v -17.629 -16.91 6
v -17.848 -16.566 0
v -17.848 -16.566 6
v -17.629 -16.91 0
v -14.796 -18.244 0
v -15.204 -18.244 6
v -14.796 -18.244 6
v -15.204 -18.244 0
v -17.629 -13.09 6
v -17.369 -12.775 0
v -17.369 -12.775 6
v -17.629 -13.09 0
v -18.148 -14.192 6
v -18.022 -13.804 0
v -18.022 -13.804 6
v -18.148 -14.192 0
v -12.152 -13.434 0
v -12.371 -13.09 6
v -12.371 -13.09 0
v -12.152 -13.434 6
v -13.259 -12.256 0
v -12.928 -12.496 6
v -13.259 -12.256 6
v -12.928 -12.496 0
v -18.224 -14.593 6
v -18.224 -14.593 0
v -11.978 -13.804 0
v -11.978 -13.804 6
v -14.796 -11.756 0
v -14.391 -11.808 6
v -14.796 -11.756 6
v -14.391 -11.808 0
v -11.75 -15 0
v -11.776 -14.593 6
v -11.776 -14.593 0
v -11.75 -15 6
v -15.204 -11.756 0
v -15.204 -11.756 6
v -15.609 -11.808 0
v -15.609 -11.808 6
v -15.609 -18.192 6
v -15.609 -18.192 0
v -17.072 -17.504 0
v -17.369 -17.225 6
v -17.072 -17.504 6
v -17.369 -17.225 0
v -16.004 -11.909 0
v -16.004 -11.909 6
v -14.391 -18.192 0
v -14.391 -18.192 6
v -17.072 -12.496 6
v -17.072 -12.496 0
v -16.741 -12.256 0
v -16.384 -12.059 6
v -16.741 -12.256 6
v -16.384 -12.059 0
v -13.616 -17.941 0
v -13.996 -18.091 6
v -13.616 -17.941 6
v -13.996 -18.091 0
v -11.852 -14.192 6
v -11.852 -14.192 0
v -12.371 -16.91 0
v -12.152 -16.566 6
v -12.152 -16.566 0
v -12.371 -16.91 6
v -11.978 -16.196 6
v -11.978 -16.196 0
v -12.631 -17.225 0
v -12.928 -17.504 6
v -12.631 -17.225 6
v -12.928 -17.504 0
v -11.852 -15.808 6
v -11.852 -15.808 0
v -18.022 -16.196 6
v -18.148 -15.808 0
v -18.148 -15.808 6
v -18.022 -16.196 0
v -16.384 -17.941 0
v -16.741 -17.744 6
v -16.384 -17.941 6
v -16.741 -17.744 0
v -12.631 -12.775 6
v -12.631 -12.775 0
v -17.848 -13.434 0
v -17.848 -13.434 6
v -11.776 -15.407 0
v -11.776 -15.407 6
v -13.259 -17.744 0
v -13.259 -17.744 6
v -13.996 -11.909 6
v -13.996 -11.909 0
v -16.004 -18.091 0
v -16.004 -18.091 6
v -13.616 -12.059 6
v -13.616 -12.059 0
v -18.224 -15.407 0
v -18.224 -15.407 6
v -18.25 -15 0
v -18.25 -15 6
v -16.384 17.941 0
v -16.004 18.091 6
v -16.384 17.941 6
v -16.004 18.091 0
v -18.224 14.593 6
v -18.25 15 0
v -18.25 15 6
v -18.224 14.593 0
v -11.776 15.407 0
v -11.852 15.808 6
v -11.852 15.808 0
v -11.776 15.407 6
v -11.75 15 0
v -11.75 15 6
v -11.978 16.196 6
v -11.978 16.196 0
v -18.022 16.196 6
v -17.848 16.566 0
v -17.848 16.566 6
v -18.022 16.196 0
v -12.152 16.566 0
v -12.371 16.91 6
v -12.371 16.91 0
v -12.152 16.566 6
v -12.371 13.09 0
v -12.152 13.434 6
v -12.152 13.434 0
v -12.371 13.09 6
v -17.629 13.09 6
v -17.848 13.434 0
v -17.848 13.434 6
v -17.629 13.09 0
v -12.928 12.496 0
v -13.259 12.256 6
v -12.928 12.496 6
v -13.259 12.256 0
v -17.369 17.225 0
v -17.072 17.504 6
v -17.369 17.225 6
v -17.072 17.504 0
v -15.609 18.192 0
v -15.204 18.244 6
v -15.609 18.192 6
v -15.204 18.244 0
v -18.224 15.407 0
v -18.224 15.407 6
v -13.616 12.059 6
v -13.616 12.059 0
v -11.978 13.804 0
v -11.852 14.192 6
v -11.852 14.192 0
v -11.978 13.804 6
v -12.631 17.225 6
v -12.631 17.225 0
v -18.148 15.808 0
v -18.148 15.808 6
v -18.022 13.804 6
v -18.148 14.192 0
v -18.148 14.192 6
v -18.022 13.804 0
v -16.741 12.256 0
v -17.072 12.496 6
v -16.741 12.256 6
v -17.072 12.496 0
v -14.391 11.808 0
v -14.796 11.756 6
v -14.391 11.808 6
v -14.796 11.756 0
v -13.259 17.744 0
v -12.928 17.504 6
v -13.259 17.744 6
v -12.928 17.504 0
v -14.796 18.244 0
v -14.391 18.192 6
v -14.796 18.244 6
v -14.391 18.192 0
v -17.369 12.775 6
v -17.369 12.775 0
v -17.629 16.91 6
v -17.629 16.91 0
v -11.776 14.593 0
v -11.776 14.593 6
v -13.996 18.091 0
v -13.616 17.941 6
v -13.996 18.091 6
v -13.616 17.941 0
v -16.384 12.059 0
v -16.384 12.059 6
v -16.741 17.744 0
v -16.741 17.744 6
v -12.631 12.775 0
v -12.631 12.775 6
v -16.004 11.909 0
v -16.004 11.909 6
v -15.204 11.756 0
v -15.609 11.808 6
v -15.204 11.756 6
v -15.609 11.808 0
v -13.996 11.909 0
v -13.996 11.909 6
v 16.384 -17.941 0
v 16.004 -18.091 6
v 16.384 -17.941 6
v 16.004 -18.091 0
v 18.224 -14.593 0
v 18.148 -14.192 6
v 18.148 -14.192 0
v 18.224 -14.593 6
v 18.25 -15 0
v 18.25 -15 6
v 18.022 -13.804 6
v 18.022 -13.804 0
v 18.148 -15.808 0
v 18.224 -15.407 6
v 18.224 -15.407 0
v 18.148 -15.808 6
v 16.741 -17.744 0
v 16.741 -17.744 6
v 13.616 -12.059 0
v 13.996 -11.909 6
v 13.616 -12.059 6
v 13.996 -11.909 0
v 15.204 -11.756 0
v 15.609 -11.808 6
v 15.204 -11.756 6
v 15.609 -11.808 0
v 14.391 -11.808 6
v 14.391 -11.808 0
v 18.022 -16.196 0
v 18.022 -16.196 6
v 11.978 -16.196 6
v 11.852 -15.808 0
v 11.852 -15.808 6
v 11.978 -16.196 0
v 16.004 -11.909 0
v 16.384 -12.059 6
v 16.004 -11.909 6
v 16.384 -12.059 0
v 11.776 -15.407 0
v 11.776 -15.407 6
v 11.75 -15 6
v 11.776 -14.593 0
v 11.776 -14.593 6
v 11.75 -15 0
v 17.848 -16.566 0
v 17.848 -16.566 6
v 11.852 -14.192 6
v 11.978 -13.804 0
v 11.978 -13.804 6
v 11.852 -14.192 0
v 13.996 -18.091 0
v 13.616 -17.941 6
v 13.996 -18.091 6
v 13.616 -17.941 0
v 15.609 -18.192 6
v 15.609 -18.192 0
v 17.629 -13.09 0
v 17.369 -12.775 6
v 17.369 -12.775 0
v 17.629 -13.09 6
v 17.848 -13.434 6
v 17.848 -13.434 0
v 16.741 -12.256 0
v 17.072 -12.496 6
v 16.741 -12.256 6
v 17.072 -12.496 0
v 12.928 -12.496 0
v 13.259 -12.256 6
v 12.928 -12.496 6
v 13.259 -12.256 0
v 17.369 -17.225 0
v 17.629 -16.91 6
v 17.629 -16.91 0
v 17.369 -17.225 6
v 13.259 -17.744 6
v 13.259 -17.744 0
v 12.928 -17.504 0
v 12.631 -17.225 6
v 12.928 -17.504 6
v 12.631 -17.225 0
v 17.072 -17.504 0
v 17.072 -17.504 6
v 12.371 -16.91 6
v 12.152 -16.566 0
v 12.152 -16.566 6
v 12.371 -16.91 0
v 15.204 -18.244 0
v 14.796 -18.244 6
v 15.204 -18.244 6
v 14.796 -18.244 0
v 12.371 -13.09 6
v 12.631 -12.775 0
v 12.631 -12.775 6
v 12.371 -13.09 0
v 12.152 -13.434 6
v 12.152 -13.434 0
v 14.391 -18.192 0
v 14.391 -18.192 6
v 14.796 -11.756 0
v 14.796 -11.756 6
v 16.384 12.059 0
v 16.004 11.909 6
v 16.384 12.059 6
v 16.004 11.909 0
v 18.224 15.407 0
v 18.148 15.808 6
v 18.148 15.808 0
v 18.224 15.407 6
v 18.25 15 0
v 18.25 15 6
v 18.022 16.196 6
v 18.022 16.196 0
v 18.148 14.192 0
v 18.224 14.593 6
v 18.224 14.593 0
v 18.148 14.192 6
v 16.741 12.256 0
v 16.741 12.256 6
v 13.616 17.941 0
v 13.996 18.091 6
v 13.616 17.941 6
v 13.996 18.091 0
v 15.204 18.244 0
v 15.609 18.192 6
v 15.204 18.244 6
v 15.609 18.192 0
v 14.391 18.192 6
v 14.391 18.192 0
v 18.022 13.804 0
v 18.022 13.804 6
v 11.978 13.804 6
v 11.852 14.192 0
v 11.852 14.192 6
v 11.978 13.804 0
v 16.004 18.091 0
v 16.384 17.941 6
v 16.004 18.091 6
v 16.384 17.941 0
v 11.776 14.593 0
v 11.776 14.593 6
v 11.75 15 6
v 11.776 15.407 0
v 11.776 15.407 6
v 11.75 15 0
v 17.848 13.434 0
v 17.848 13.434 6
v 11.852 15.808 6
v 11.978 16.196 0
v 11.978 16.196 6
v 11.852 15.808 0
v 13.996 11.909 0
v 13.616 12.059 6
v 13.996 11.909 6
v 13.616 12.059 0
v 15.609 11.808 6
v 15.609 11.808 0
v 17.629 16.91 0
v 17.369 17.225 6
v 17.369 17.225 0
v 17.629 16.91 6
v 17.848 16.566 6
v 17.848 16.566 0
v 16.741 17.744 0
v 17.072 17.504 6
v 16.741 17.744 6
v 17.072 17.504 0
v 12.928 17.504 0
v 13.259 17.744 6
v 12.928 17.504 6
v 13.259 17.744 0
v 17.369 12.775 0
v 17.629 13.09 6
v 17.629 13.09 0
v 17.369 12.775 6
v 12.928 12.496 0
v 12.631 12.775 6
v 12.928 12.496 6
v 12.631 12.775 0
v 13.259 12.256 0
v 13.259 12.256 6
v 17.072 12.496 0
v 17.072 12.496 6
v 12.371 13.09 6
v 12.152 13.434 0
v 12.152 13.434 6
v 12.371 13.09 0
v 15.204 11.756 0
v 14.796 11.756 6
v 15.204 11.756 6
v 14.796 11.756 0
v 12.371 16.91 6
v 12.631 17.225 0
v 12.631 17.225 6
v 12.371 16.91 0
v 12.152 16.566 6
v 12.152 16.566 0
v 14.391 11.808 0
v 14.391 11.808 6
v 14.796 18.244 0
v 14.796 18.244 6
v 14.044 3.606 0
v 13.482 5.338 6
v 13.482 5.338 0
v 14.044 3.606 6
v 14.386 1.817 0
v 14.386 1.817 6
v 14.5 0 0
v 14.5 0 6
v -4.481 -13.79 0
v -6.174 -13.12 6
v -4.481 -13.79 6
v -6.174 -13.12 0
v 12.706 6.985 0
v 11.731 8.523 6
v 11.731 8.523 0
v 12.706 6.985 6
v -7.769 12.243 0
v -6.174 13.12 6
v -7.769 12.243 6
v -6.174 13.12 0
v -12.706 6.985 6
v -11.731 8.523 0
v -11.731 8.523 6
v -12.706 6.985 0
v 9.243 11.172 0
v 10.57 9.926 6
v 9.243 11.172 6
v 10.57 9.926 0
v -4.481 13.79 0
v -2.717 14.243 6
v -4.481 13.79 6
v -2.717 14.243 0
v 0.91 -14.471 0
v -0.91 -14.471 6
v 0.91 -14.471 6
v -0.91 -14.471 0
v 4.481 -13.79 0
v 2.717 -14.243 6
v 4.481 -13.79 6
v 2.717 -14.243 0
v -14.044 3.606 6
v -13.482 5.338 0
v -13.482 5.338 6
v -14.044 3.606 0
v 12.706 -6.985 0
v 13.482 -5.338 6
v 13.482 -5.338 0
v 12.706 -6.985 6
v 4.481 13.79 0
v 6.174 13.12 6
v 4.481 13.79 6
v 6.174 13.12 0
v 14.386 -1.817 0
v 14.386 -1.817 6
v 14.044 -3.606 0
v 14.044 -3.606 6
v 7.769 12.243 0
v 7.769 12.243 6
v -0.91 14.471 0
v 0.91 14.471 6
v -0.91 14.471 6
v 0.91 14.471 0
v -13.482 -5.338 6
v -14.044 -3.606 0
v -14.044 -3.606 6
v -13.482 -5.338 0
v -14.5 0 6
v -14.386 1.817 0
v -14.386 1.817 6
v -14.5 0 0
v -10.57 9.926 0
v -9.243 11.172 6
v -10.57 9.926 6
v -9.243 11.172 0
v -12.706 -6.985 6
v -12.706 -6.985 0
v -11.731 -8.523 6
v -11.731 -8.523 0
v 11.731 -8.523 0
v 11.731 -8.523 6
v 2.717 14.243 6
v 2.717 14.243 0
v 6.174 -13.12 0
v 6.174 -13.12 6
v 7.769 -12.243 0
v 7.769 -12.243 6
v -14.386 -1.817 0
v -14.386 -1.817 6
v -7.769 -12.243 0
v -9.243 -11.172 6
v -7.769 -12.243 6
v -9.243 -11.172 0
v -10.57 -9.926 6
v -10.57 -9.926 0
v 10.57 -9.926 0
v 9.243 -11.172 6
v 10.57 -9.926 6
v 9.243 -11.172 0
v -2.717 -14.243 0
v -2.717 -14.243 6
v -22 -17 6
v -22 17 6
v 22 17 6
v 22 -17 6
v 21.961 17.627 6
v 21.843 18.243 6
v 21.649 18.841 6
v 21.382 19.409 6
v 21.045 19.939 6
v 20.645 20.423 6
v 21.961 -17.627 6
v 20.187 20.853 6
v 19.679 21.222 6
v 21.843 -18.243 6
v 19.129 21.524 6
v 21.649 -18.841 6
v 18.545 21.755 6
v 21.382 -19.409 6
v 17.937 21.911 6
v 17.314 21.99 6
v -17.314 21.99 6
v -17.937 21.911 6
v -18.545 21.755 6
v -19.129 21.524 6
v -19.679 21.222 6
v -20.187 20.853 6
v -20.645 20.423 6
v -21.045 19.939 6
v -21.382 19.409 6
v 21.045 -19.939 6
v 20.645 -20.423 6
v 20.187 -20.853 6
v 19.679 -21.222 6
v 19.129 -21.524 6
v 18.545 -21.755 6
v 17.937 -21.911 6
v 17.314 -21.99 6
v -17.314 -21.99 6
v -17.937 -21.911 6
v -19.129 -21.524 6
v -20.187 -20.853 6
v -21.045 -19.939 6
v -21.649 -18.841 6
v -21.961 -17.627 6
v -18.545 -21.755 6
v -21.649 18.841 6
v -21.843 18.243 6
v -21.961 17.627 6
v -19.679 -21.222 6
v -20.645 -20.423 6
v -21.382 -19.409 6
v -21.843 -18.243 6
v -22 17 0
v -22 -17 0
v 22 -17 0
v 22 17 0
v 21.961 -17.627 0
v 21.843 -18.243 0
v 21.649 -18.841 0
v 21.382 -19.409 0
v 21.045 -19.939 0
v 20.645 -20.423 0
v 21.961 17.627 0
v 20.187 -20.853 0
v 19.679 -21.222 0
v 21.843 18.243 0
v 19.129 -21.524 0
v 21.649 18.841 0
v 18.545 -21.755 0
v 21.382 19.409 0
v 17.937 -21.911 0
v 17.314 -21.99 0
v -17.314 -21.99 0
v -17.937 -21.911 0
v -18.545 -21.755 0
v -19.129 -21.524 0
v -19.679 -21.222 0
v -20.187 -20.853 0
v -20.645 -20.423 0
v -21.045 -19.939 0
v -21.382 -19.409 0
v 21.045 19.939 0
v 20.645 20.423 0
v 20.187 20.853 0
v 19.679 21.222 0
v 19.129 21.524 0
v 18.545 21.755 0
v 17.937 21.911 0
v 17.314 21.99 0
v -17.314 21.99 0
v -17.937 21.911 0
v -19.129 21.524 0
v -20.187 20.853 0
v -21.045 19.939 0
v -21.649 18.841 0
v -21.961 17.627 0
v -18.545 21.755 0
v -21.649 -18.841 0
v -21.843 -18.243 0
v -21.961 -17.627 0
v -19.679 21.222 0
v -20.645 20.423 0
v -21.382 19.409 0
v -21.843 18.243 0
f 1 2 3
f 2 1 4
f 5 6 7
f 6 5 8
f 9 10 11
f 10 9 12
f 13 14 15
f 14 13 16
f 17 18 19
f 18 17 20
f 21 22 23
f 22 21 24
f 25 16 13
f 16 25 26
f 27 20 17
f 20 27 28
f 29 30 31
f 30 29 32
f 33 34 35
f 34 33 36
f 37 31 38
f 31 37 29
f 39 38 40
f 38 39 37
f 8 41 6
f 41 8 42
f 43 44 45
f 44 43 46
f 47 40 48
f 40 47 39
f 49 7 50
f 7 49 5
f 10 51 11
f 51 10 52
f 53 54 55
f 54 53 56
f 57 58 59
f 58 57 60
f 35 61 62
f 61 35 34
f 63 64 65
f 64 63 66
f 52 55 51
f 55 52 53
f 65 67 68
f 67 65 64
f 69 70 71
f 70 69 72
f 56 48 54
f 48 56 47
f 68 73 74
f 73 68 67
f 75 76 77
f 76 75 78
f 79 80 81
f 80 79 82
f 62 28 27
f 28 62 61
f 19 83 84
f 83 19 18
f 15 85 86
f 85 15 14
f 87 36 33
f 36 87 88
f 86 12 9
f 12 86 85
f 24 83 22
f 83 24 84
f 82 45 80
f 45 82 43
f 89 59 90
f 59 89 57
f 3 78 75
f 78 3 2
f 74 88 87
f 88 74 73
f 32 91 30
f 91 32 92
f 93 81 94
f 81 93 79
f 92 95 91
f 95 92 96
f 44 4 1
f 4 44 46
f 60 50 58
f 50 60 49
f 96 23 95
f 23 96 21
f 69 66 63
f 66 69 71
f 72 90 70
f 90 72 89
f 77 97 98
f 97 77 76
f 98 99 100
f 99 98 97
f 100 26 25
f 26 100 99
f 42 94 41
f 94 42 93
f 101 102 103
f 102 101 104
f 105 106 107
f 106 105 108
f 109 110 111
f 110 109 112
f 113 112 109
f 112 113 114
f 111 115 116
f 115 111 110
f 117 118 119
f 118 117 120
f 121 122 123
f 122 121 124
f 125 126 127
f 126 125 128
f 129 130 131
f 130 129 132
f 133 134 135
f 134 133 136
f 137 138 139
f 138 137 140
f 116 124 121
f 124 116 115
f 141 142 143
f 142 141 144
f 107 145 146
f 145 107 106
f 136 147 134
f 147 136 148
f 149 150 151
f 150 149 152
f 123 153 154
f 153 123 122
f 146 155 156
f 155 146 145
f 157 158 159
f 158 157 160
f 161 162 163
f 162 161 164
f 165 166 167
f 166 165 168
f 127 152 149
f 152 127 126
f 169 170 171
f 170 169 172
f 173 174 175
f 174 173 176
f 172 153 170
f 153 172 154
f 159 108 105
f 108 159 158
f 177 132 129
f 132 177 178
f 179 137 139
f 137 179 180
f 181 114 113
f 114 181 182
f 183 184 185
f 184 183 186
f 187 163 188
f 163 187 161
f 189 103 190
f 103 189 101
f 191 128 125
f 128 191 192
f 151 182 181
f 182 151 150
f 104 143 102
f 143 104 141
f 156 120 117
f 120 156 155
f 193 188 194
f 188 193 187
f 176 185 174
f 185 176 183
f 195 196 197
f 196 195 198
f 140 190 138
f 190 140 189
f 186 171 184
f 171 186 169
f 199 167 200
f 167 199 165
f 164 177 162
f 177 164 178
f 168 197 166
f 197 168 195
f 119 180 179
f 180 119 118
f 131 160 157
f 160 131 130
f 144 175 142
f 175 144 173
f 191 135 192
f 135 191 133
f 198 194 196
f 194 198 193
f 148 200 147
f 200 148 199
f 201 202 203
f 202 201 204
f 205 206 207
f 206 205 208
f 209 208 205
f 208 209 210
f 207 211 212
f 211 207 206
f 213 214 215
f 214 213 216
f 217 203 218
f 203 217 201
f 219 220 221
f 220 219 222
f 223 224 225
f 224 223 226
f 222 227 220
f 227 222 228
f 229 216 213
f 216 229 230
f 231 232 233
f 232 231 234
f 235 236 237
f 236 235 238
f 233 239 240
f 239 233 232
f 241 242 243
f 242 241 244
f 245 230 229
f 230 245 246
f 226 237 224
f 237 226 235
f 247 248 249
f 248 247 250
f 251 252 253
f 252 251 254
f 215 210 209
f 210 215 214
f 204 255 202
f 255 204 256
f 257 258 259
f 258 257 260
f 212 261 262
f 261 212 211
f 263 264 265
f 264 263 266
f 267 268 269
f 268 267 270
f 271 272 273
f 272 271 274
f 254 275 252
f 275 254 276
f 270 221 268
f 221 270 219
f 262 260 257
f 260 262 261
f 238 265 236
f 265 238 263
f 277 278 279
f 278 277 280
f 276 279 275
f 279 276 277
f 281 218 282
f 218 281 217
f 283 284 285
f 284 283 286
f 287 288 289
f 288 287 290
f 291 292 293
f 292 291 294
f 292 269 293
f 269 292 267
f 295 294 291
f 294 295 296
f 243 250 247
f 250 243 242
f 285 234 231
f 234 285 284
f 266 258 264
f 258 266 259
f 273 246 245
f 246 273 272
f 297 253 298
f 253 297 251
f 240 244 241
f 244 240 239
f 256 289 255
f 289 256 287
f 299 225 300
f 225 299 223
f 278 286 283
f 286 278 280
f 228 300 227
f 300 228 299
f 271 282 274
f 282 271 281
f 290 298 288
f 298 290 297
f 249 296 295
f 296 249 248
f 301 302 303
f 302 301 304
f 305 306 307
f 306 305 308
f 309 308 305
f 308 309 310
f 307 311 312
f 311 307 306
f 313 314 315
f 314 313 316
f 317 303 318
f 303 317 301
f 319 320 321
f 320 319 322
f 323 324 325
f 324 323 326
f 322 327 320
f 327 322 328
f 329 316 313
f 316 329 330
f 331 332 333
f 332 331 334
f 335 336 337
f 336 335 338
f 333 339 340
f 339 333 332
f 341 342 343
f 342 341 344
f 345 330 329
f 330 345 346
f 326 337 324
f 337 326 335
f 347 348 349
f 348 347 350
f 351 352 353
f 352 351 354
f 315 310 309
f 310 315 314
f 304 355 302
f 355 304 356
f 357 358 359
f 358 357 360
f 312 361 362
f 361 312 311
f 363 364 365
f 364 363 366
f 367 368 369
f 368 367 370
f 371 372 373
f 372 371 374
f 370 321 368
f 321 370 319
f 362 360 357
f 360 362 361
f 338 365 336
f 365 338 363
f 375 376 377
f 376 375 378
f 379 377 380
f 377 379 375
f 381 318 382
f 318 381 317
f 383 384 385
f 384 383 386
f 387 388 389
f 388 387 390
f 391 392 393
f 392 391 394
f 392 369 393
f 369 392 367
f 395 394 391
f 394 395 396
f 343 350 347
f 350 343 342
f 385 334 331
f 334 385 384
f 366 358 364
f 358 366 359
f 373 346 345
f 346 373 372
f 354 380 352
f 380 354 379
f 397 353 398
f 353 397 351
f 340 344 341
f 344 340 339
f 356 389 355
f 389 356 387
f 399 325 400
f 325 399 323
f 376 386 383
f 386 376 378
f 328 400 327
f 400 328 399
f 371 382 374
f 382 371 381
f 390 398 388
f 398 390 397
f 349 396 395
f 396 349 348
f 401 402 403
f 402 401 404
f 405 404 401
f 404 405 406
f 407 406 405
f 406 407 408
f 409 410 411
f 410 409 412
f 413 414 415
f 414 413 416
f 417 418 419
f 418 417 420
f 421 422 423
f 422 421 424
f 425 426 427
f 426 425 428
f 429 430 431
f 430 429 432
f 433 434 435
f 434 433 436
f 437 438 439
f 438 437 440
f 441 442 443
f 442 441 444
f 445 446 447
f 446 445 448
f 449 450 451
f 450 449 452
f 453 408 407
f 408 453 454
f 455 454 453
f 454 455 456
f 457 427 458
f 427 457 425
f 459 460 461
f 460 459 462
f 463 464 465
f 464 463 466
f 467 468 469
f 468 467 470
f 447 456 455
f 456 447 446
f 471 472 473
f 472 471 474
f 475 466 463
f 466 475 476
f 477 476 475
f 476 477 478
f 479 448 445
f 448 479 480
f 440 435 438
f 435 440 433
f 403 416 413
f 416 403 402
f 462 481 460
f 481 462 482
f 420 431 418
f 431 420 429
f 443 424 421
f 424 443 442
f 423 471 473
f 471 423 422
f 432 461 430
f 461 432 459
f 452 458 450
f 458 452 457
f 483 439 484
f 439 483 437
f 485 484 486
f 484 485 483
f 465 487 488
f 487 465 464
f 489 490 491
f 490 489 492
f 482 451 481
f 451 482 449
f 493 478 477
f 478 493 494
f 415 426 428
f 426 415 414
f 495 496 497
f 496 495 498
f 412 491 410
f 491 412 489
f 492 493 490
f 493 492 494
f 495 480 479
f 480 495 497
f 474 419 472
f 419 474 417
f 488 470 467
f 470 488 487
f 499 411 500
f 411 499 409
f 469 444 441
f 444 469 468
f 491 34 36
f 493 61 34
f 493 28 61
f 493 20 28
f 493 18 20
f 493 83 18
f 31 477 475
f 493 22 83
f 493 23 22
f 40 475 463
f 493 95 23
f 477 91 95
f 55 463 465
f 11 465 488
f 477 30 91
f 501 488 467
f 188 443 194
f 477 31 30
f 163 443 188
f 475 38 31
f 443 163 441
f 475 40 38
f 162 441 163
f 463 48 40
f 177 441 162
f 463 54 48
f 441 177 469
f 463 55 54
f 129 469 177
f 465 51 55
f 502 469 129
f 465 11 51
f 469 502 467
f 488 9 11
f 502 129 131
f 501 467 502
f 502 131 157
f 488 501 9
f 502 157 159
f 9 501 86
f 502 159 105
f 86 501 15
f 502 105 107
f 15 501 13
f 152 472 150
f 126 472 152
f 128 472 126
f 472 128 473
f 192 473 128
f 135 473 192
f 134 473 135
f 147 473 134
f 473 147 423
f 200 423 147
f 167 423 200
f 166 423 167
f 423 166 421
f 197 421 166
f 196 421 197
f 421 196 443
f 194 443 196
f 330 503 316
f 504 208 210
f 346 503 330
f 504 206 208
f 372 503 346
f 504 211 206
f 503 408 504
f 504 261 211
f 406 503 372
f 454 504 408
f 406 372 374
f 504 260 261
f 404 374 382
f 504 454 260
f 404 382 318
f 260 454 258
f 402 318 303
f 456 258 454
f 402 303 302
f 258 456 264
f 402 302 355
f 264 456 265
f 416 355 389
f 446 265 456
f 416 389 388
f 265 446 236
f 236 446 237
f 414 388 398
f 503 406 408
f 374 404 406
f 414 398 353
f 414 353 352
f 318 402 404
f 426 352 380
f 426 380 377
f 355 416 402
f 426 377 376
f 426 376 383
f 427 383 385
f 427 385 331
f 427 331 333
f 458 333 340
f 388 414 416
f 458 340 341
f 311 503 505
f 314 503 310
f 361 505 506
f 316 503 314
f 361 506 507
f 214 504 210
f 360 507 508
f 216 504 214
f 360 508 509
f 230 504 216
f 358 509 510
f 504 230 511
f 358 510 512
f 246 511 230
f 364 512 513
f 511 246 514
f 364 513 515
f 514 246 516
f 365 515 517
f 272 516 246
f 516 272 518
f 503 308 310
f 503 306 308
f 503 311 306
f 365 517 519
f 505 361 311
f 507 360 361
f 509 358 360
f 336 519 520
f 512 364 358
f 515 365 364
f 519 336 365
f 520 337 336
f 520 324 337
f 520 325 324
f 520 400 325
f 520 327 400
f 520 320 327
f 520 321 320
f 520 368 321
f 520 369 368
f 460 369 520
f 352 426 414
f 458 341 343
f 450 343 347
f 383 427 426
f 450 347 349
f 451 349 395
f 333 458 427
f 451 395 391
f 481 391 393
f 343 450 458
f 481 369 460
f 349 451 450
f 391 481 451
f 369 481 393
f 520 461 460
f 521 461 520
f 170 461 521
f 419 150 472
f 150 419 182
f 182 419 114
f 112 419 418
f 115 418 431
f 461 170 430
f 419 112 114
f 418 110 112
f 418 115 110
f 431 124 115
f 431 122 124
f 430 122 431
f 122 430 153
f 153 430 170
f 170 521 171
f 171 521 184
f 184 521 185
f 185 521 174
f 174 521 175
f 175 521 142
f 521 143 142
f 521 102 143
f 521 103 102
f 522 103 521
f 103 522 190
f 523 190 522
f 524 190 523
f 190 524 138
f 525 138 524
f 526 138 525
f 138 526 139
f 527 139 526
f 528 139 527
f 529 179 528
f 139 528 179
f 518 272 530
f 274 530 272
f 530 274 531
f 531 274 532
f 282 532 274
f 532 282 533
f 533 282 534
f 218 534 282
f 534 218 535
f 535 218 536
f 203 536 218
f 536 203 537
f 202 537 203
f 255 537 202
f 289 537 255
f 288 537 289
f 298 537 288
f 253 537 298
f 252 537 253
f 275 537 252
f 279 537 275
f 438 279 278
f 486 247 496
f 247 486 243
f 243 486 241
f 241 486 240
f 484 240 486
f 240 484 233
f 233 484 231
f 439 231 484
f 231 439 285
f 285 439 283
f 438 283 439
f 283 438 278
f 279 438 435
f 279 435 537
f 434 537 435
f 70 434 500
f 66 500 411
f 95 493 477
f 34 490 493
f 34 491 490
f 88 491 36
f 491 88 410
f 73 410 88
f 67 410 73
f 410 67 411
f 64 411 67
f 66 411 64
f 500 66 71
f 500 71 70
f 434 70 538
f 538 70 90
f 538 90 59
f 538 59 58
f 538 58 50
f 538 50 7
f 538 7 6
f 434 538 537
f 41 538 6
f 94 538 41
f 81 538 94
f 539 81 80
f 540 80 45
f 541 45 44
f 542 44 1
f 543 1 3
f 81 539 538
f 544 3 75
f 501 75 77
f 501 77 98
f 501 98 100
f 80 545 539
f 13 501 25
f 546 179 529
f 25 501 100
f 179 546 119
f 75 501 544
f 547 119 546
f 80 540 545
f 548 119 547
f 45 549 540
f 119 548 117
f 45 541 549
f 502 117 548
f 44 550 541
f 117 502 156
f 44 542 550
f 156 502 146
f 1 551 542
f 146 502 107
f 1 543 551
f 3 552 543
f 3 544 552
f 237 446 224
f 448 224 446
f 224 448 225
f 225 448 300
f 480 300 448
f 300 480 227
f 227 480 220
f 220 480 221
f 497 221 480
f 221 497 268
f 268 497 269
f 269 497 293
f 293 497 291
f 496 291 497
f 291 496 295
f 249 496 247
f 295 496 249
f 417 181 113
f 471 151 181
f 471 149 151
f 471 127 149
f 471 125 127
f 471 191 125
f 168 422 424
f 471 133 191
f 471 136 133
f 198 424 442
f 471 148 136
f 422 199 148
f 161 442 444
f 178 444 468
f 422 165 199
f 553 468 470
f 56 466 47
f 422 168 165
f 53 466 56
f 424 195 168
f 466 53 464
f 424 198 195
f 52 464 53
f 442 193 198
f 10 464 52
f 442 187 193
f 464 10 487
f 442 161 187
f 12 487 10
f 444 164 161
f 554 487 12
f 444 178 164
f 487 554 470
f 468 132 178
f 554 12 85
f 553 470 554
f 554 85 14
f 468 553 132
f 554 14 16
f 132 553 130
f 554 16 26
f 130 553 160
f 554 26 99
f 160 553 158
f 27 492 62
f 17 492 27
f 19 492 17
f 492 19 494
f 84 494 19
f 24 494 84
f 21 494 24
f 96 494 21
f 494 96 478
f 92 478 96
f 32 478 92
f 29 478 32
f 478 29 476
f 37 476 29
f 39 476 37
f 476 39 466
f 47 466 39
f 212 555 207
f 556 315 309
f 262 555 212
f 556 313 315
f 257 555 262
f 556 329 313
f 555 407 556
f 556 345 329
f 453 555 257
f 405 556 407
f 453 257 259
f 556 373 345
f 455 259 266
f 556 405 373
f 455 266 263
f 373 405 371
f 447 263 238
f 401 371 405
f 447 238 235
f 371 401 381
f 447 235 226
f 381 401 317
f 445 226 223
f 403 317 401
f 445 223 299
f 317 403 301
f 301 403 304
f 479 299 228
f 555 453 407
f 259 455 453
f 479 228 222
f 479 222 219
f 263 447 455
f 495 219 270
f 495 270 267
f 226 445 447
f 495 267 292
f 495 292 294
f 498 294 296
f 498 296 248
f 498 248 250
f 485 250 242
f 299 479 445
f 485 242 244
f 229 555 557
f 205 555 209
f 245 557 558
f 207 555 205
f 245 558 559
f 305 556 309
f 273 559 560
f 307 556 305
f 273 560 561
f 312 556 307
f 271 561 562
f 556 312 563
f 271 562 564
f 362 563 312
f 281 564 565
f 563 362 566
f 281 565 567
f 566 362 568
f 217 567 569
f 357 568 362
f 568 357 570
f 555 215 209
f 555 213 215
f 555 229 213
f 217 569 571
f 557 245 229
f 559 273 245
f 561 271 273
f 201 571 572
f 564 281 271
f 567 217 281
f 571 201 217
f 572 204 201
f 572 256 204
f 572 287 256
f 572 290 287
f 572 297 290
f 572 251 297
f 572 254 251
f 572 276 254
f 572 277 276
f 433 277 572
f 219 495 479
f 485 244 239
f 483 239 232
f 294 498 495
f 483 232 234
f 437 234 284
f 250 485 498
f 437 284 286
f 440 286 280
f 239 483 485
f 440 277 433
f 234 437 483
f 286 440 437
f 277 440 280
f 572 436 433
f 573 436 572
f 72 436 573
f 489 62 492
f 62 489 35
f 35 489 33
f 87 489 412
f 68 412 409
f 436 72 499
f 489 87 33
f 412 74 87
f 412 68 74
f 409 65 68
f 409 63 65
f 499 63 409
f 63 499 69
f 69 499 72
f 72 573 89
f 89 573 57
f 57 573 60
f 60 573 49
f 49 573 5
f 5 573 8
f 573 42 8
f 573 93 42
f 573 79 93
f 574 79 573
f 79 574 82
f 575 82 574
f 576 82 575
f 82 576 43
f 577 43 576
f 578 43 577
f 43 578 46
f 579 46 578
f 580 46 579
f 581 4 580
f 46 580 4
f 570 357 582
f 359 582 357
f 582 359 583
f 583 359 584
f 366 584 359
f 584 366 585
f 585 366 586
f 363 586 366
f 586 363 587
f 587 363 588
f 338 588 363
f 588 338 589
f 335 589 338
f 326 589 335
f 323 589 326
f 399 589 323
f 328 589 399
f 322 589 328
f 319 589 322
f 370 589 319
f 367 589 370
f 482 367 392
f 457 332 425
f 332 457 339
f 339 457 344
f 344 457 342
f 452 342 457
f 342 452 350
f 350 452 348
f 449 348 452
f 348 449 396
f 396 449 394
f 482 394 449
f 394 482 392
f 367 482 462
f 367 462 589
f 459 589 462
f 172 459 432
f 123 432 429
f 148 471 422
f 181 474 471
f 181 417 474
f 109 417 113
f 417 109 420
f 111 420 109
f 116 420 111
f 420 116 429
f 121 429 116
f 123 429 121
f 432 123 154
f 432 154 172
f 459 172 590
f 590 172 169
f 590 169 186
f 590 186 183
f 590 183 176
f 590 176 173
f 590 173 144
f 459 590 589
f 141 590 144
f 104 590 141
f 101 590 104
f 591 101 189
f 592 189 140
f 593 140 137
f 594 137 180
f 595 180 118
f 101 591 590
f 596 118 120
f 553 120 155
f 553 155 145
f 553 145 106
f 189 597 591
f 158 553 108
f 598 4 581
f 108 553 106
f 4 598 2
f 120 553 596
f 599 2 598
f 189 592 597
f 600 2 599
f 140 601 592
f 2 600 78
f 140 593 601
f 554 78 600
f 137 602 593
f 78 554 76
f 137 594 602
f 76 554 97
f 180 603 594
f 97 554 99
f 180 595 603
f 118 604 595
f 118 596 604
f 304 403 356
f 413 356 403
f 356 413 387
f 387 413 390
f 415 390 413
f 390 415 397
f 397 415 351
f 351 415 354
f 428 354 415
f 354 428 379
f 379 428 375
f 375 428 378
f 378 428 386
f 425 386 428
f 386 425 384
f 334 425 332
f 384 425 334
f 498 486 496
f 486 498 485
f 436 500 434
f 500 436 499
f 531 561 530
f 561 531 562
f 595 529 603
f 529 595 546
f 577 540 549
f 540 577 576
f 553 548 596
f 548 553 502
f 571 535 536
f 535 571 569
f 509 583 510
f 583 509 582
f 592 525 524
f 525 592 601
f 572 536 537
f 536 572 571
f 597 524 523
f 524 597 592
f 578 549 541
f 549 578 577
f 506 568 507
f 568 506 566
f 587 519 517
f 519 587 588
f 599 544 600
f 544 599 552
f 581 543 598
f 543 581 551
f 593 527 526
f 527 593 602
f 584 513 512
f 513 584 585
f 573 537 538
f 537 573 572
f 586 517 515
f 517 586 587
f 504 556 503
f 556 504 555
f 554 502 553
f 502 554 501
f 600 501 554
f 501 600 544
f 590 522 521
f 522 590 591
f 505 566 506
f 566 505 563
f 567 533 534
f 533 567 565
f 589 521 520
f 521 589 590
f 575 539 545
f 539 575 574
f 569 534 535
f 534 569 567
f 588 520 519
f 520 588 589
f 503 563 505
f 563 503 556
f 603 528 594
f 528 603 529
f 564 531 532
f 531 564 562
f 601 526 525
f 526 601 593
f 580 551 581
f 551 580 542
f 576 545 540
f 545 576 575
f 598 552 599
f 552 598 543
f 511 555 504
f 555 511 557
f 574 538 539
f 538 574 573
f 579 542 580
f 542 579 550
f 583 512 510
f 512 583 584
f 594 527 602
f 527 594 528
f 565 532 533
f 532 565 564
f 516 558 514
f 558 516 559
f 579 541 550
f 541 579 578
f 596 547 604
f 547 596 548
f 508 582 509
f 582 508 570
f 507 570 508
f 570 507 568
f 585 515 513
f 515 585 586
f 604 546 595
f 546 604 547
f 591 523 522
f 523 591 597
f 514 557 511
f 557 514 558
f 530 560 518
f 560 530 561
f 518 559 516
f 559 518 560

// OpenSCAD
$fn = 50;


difference() {
	union() {
		hull() {
			translate(v = [-17.0000000000, 17.0000000000, 0]) {
				cylinder(h = 6, r = 5);
			}
			translate(v = [17.0000000000, 17.0000000000, 0]) {
				cylinder(h = 6, r = 5);
			}
			translate(v = [-17.0000000000, -17.0000000000, 0]) {
				cylinder(h = 6, r = 5);
			}
			translate(v = [17.0000000000, -17.0000000000, 0]) {
				cylinder(h = 6, r = 5);
			}
		}
	}
	union() {
		#translate(v = [-15.0000000000, -15.0000000000, -100.0000000000]) {
			cylinder(h = 200, r = 3.2500000000);
		}
		#translate(v = [-15.0000000000, 15.0000000000, -100.0000000000]) {
			cylinder(h = 200, r = 3.2500000000);
		}
		#translate(v = [15.0000000000, -15.0000000000, -100.0000000000]) {
			cylinder(h = 200, r = 3.2500000000);
		}
		#translate(v = [15.0000000000, 15.0000000000, -100.0000000000]) {
			cylinder(h = 200, r = 3.2500000000);
		}
		#cylinder(h = 6, r = 14.5000000000);
	}
}
